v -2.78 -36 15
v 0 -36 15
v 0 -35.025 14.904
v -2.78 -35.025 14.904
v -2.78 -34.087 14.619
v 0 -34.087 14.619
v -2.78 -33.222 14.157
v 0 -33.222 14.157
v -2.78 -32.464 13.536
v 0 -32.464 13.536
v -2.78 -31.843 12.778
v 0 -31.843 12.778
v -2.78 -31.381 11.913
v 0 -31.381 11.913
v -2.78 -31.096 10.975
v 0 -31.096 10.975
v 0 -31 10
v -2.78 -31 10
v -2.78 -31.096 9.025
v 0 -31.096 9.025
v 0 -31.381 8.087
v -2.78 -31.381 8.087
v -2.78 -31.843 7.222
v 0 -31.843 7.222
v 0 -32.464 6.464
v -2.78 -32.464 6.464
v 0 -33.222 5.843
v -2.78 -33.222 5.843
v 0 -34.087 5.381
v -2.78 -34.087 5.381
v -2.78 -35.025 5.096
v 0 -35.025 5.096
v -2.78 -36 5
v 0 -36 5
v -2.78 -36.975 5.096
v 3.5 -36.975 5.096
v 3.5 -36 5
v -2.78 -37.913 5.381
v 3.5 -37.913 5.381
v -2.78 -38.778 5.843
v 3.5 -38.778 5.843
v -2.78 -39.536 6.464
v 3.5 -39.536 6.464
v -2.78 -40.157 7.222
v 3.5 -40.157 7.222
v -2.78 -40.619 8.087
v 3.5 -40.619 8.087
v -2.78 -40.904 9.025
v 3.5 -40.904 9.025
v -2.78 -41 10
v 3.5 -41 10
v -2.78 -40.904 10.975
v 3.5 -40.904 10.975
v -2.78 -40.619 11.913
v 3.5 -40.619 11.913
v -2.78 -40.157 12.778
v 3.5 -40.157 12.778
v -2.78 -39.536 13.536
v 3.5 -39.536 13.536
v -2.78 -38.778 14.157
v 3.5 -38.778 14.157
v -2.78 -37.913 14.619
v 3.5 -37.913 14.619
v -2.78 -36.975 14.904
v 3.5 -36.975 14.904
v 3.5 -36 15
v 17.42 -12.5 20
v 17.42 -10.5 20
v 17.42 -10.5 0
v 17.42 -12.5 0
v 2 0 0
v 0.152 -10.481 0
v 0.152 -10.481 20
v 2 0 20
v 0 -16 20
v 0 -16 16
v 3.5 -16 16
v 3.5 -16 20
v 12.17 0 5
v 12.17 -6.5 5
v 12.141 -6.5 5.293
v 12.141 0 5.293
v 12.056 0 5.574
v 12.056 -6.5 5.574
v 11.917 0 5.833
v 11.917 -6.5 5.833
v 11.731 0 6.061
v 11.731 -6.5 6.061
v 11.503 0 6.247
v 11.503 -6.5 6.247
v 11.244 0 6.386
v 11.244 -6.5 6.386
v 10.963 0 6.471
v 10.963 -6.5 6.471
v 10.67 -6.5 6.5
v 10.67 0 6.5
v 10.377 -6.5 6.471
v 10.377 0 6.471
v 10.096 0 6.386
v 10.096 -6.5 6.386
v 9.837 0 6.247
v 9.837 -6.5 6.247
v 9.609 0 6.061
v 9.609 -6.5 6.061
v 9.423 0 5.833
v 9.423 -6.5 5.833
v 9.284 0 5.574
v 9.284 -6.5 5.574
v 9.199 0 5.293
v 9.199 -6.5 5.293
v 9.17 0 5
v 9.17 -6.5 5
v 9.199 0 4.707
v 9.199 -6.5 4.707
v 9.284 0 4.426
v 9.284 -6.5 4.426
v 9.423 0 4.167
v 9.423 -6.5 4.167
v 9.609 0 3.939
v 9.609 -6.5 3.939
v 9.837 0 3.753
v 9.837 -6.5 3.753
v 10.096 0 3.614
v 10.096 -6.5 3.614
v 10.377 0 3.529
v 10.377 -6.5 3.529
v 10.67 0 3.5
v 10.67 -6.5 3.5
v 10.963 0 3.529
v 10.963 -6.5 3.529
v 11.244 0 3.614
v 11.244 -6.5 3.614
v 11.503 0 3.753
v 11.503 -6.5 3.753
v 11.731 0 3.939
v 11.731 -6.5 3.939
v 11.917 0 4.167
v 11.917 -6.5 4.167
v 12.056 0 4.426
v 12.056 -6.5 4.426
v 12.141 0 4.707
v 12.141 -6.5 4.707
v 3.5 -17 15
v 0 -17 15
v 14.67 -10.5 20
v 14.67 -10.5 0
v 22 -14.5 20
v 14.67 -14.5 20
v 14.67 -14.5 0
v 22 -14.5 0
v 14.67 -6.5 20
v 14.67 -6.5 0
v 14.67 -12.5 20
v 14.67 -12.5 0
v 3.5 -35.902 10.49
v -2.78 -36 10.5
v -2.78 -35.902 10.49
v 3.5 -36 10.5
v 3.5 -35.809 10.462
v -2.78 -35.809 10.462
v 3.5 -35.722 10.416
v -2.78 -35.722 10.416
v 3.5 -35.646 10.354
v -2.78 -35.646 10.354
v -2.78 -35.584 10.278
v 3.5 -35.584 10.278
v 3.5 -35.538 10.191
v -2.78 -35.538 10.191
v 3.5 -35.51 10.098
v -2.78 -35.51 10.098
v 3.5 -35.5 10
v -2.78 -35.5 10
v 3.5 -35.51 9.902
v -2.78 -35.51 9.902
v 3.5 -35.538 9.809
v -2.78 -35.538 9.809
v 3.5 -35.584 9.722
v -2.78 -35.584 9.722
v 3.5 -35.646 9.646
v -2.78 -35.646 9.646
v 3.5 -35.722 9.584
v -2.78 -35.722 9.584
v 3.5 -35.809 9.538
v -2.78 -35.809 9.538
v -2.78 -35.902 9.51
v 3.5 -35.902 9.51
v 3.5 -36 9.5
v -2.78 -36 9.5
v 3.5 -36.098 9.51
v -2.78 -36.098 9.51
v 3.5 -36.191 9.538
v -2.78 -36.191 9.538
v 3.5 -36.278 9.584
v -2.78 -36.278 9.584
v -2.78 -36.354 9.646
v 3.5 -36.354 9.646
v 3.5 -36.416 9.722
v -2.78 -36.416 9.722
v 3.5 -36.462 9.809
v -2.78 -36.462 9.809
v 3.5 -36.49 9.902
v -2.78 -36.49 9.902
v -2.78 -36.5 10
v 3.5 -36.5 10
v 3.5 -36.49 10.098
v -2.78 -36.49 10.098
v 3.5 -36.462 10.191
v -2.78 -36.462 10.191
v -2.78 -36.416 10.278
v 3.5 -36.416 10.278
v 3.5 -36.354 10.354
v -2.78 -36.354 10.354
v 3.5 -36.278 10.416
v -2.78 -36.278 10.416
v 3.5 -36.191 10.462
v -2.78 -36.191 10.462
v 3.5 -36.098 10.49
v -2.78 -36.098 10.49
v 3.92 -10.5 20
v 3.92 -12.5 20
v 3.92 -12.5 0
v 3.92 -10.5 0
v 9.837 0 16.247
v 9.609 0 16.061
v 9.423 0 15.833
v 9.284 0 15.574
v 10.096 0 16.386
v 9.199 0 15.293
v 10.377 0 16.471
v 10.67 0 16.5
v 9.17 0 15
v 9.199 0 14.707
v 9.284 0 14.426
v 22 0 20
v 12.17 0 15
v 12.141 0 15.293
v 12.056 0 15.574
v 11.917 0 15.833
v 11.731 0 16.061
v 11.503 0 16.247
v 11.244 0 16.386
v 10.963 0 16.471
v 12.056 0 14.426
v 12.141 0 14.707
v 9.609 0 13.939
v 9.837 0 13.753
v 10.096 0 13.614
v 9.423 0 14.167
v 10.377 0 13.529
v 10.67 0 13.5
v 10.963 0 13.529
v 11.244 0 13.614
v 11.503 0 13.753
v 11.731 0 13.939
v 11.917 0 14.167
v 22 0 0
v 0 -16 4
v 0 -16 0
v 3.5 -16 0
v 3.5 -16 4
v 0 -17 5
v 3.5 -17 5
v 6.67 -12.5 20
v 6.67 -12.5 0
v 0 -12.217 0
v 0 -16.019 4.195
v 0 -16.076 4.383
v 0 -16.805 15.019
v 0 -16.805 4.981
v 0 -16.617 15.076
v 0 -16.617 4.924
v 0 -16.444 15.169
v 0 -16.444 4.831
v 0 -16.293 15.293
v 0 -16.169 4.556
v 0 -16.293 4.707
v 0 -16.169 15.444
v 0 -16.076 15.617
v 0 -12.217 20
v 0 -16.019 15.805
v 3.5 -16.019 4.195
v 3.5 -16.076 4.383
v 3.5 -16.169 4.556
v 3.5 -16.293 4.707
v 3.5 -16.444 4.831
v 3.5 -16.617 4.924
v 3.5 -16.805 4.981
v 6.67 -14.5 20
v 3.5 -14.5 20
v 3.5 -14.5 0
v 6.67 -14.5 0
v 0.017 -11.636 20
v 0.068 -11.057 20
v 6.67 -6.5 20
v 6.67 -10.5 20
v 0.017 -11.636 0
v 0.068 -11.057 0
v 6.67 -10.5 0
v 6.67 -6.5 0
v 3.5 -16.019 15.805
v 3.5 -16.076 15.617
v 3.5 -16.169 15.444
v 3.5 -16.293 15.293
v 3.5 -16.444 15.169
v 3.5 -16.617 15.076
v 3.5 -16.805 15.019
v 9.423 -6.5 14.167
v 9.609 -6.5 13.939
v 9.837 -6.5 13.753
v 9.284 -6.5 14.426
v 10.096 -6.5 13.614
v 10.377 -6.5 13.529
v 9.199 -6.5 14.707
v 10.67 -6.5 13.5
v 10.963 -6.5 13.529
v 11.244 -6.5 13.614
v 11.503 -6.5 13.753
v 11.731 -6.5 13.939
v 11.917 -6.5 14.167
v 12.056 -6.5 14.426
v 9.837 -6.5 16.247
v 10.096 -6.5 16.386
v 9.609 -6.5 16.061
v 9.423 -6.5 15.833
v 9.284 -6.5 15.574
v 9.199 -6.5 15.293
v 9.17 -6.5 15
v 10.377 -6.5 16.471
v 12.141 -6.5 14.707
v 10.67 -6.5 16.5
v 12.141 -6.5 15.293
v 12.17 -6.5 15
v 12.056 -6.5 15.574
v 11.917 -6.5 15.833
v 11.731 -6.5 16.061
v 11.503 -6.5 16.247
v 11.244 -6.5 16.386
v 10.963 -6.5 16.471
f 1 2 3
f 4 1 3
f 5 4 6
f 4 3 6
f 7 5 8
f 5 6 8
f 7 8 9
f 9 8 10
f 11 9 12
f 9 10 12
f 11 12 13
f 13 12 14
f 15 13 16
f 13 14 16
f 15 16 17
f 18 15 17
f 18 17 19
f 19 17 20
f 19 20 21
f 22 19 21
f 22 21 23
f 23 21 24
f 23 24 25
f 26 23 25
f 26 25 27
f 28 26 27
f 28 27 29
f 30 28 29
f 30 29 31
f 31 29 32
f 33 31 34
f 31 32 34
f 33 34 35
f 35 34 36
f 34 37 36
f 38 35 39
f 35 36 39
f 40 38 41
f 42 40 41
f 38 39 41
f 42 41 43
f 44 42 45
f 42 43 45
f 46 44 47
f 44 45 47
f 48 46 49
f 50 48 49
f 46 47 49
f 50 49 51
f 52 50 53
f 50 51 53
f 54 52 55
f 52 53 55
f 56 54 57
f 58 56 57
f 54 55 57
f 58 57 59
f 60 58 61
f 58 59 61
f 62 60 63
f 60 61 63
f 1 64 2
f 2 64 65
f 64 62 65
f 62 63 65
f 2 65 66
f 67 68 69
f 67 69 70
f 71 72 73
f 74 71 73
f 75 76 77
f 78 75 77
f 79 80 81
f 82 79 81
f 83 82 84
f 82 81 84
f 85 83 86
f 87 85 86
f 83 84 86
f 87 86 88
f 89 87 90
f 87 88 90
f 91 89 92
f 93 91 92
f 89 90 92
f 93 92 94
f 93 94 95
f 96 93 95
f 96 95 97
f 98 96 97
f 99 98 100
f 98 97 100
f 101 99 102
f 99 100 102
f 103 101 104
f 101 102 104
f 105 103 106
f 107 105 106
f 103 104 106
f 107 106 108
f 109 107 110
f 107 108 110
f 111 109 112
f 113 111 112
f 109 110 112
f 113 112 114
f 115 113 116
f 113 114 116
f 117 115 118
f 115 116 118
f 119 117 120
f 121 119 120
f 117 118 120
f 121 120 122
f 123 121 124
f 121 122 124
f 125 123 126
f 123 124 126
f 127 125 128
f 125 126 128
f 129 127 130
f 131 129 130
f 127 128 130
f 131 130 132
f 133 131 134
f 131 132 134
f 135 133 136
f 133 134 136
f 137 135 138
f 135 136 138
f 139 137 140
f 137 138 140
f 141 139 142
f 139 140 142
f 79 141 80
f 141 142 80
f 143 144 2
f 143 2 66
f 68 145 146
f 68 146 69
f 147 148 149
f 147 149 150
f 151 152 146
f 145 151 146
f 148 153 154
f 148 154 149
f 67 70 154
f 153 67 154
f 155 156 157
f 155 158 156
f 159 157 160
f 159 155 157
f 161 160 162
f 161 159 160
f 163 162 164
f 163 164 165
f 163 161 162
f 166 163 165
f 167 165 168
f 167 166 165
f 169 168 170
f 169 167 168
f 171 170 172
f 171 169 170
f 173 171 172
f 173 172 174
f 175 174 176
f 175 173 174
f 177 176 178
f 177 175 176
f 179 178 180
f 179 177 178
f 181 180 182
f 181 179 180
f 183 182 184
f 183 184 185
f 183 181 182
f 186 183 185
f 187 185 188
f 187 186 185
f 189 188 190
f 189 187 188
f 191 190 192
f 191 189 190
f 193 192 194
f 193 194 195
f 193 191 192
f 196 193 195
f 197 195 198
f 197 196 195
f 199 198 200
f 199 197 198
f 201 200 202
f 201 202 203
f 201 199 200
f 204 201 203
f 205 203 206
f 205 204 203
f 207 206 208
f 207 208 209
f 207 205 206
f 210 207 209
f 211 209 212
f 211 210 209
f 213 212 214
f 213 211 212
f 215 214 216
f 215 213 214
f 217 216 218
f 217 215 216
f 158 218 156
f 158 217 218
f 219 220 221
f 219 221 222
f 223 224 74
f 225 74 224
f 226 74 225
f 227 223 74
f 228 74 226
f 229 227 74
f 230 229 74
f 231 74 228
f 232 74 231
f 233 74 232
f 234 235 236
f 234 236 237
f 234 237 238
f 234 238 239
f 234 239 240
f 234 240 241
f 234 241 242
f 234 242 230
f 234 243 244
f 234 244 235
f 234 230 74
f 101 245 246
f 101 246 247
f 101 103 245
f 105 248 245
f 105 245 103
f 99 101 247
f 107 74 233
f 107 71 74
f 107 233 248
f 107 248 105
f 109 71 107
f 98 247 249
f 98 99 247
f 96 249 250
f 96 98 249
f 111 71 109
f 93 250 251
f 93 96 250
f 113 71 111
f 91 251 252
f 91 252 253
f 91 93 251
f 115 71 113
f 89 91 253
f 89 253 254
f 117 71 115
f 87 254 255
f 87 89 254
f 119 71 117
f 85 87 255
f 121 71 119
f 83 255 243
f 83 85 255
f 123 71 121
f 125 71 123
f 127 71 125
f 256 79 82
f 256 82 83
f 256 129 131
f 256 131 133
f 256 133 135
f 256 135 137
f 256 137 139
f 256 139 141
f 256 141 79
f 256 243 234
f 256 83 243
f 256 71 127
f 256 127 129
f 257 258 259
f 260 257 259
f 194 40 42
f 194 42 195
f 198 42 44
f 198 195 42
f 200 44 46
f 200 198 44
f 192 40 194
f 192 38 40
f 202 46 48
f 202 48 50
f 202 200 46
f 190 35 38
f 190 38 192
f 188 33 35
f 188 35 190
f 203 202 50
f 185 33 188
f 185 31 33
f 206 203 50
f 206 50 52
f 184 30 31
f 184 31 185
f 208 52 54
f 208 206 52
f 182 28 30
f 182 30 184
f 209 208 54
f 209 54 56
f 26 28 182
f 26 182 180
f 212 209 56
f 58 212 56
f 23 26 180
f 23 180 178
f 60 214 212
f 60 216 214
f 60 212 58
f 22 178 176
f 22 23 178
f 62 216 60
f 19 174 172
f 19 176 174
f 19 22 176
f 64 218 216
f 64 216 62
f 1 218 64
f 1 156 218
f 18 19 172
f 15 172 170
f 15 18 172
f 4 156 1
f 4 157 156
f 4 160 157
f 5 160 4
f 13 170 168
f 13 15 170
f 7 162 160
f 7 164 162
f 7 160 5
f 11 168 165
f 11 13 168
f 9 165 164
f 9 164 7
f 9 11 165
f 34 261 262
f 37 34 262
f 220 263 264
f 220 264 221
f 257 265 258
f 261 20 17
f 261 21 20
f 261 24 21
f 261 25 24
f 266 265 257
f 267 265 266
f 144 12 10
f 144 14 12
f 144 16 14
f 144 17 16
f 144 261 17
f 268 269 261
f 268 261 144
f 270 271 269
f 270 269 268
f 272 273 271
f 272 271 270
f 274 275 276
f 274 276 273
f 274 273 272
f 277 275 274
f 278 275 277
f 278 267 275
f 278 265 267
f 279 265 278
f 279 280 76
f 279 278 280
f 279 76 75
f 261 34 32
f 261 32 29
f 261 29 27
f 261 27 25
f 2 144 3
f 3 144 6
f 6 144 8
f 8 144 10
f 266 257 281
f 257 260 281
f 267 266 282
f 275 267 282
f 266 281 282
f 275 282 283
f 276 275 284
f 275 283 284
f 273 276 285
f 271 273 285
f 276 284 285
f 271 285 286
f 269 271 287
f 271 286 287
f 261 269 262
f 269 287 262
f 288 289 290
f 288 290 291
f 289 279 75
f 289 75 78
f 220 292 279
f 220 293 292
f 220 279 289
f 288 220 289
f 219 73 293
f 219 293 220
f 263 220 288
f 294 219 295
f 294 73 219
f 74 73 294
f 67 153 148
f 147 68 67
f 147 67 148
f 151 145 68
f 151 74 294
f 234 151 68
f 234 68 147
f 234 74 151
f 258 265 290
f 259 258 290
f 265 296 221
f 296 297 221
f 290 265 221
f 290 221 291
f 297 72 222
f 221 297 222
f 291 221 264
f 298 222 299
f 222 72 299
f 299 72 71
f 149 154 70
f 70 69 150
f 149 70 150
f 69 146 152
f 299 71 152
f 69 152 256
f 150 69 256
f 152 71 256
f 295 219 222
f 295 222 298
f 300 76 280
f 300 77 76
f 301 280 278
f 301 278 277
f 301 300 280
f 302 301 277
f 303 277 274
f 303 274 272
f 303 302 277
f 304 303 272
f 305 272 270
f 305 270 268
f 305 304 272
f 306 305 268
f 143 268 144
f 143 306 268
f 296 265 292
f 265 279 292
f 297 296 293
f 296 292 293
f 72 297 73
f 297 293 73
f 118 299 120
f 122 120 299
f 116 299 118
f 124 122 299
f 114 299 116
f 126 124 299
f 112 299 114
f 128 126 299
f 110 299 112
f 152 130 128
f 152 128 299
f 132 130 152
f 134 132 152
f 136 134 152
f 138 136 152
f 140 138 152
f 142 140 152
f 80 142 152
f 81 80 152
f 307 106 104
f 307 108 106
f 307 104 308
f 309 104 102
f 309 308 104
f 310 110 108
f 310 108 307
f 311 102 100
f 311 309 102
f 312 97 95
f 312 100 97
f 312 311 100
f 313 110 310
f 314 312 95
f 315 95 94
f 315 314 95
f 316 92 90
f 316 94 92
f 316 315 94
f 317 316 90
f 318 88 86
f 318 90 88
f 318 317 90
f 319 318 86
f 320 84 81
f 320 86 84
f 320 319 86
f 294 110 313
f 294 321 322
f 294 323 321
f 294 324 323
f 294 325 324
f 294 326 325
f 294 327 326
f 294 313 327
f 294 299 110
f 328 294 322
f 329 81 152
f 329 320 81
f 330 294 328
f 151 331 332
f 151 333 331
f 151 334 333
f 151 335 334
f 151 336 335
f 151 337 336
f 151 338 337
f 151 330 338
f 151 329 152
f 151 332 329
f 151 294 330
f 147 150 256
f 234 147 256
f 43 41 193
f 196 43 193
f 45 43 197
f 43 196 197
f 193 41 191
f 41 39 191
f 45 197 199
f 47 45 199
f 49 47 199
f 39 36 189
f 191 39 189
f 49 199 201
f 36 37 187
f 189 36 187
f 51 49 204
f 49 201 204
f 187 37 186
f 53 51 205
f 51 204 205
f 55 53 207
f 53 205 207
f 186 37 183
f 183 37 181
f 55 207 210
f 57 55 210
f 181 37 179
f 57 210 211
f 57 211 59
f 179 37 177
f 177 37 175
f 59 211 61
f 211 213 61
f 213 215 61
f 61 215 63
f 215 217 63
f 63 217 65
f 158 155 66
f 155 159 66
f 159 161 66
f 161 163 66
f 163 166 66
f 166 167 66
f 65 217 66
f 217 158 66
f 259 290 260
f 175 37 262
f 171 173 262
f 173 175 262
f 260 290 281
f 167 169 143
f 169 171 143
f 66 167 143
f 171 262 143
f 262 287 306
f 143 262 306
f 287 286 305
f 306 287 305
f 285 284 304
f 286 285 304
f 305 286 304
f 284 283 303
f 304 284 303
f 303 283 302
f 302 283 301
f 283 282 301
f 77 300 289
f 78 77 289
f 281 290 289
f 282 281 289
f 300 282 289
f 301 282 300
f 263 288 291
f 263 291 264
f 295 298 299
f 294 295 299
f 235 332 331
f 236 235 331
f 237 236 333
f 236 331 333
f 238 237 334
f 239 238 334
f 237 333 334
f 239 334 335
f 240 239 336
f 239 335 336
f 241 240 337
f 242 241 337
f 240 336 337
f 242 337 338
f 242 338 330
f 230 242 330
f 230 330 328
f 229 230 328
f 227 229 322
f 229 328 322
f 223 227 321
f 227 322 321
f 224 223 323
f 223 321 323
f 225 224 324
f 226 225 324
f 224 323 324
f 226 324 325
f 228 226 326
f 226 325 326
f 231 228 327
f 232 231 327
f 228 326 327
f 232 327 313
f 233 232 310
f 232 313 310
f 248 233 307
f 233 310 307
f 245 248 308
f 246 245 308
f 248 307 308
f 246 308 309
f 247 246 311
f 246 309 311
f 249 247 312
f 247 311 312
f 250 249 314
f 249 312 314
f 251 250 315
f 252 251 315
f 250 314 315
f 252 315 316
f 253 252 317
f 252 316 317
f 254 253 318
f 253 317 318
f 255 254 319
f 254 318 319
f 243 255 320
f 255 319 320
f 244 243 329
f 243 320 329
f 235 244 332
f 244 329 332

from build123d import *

# Parameters (mm, degrees)
SKETCH1_W           = 22
SKETCH1_H           = 16
BOSS_EXTRUDE1_DEPTH = 20
CHAMFER1_SIZE       = 2
CHAMFER1_SIZE2      = 11.342563639
CUT_EXTRUDE1_DEPTH  = 20
FILLET1_R           = 10
SKETCH3_W           = 3.5
SKETCH3_H           = 10
BOSS_EXTRUDE2_DEPTH = 20
FILLET2_R           = 1
BOSS_EXTRUDE3_DEPTH = 3.5
SKETCH8_R           = 0.5
CUT_EXTRUDE2_DEPTH  = 3.5
SKETCH9_R           = 1.5
CUT_EXTRUDE3_DEPTH  = 6.5
SKETCH10_R          = 5
SKETCH10_R_2        = 0.5
BOSS_EXTRUDE4_DEPTH = 2.78


with BuildPart() as part:
    # Sketch1 → Boss-Extrude1 (new body)
    with BuildSketch(Plane.XY):
        with Locations((11, -8)):
            Rectangle(SKETCH1_W, SKETCH1_H)
    extrude(amount=BOSS_EXTRUDE1_DEPTH)

    # Chamfer1
    chamfer1_edges = [part.edges().sort_by_distance(p)[0] for p in [
        (0, 0, 10),
    ]]
    chamfer1_side = [part.faces().sort_by_distance(p)[0] for p in [
        (11, 0, 10),
    ]]
    chamfer(chamfer1_edges, length=CHAMFER1_SIZE, length2=CHAMFER1_SIZE2, reference=chamfer1_side[0])

    # Sketch2 → Cut-Extrude1 (cut)
    with BuildSketch(Plane.XY.offset(20)):
        Polygon((3.5, -16), (3.5, -14.5), (6.67, -14.5), (6.67, -12.5), (3.92, -12.5), (3.92, -10.5), (6.67, -10.5), (6.67, -6.5), (14.67, -6.5), (14.67, -10.5), (17.42, -10.5), (17.42, -12.5), (14.67, -12.5), (14.67, -14.5), (22, -14.5), (22, -16), align=None)
    extrude(amount=-CUT_EXTRUDE1_DEPTH, mode=Mode.SUBTRACT)

    # Fillet1
    fillet1_edges = [part.edges().sort_by_distance(p)[0] for p in [
        (0, -11.342563639, 10),
    ]]
    fillet(fillet1_edges, radius=FILLET1_R)

    # Sketch3 → Boss-Extrude2 (add)
    with BuildSketch(Plane.XZ.offset(16)):
        with Locations((1.75, 10)):
            Rectangle(SKETCH3_W, SKETCH3_H)
    extrude(amount=BOSS_EXTRUDE2_DEPTH)

    # Fillet2
    fillet2_edges = [part.edges().sort_by_distance(p)[0] for p in [
        (1.75, -16, 5),
        (1.75, -16, 15),
    ]]
    fillet(fillet2_edges, radius=FILLET2_R)

    # Sketch7 → Boss-Extrude3 (add)
    with BuildSketch(Plane.ZY):
        with BuildLine():
            Line((15, -36), (5, -36))
            ThreePointArc((5, -36), (10, -41), (15, -36))
        make_face()
    extrude(amount=-BOSS_EXTRUDE3_DEPTH)

    # Sketch8 → Cut-Extrude2 (cut)
    with BuildSketch(Plane.ZY):
        with Locations((10, -36)):
            Circle(SKETCH8_R)
    extrude(amount=-CUT_EXTRUDE2_DEPTH, mode=Mode.SUBTRACT)

    # Sketch9 → Cut-Extrude3 (cut)
    with BuildSketch(Plane.XZ.offset(6.5)):
        with Locations((10.67, 15)):
            Circle(SKETCH9_R)
        with Locations((10.67, 5)):
            Circle(SKETCH9_R)
    extrude(amount=-CUT_EXTRUDE3_DEPTH, mode=Mode.SUBTRACT)

    # Sketch10 → Boss-Extrude4 (add)
    with BuildSketch(Plane.ZY):
        with Locations((10, -36)):
            Circle(SKETCH10_R)
        with Locations((10, -36)):
            Circle(SKETCH10_R_2, mode=Mode.SUBTRACT)
    extrude(amount=BOSS_EXTRUDE4_DEPTH)


solid = part.part
